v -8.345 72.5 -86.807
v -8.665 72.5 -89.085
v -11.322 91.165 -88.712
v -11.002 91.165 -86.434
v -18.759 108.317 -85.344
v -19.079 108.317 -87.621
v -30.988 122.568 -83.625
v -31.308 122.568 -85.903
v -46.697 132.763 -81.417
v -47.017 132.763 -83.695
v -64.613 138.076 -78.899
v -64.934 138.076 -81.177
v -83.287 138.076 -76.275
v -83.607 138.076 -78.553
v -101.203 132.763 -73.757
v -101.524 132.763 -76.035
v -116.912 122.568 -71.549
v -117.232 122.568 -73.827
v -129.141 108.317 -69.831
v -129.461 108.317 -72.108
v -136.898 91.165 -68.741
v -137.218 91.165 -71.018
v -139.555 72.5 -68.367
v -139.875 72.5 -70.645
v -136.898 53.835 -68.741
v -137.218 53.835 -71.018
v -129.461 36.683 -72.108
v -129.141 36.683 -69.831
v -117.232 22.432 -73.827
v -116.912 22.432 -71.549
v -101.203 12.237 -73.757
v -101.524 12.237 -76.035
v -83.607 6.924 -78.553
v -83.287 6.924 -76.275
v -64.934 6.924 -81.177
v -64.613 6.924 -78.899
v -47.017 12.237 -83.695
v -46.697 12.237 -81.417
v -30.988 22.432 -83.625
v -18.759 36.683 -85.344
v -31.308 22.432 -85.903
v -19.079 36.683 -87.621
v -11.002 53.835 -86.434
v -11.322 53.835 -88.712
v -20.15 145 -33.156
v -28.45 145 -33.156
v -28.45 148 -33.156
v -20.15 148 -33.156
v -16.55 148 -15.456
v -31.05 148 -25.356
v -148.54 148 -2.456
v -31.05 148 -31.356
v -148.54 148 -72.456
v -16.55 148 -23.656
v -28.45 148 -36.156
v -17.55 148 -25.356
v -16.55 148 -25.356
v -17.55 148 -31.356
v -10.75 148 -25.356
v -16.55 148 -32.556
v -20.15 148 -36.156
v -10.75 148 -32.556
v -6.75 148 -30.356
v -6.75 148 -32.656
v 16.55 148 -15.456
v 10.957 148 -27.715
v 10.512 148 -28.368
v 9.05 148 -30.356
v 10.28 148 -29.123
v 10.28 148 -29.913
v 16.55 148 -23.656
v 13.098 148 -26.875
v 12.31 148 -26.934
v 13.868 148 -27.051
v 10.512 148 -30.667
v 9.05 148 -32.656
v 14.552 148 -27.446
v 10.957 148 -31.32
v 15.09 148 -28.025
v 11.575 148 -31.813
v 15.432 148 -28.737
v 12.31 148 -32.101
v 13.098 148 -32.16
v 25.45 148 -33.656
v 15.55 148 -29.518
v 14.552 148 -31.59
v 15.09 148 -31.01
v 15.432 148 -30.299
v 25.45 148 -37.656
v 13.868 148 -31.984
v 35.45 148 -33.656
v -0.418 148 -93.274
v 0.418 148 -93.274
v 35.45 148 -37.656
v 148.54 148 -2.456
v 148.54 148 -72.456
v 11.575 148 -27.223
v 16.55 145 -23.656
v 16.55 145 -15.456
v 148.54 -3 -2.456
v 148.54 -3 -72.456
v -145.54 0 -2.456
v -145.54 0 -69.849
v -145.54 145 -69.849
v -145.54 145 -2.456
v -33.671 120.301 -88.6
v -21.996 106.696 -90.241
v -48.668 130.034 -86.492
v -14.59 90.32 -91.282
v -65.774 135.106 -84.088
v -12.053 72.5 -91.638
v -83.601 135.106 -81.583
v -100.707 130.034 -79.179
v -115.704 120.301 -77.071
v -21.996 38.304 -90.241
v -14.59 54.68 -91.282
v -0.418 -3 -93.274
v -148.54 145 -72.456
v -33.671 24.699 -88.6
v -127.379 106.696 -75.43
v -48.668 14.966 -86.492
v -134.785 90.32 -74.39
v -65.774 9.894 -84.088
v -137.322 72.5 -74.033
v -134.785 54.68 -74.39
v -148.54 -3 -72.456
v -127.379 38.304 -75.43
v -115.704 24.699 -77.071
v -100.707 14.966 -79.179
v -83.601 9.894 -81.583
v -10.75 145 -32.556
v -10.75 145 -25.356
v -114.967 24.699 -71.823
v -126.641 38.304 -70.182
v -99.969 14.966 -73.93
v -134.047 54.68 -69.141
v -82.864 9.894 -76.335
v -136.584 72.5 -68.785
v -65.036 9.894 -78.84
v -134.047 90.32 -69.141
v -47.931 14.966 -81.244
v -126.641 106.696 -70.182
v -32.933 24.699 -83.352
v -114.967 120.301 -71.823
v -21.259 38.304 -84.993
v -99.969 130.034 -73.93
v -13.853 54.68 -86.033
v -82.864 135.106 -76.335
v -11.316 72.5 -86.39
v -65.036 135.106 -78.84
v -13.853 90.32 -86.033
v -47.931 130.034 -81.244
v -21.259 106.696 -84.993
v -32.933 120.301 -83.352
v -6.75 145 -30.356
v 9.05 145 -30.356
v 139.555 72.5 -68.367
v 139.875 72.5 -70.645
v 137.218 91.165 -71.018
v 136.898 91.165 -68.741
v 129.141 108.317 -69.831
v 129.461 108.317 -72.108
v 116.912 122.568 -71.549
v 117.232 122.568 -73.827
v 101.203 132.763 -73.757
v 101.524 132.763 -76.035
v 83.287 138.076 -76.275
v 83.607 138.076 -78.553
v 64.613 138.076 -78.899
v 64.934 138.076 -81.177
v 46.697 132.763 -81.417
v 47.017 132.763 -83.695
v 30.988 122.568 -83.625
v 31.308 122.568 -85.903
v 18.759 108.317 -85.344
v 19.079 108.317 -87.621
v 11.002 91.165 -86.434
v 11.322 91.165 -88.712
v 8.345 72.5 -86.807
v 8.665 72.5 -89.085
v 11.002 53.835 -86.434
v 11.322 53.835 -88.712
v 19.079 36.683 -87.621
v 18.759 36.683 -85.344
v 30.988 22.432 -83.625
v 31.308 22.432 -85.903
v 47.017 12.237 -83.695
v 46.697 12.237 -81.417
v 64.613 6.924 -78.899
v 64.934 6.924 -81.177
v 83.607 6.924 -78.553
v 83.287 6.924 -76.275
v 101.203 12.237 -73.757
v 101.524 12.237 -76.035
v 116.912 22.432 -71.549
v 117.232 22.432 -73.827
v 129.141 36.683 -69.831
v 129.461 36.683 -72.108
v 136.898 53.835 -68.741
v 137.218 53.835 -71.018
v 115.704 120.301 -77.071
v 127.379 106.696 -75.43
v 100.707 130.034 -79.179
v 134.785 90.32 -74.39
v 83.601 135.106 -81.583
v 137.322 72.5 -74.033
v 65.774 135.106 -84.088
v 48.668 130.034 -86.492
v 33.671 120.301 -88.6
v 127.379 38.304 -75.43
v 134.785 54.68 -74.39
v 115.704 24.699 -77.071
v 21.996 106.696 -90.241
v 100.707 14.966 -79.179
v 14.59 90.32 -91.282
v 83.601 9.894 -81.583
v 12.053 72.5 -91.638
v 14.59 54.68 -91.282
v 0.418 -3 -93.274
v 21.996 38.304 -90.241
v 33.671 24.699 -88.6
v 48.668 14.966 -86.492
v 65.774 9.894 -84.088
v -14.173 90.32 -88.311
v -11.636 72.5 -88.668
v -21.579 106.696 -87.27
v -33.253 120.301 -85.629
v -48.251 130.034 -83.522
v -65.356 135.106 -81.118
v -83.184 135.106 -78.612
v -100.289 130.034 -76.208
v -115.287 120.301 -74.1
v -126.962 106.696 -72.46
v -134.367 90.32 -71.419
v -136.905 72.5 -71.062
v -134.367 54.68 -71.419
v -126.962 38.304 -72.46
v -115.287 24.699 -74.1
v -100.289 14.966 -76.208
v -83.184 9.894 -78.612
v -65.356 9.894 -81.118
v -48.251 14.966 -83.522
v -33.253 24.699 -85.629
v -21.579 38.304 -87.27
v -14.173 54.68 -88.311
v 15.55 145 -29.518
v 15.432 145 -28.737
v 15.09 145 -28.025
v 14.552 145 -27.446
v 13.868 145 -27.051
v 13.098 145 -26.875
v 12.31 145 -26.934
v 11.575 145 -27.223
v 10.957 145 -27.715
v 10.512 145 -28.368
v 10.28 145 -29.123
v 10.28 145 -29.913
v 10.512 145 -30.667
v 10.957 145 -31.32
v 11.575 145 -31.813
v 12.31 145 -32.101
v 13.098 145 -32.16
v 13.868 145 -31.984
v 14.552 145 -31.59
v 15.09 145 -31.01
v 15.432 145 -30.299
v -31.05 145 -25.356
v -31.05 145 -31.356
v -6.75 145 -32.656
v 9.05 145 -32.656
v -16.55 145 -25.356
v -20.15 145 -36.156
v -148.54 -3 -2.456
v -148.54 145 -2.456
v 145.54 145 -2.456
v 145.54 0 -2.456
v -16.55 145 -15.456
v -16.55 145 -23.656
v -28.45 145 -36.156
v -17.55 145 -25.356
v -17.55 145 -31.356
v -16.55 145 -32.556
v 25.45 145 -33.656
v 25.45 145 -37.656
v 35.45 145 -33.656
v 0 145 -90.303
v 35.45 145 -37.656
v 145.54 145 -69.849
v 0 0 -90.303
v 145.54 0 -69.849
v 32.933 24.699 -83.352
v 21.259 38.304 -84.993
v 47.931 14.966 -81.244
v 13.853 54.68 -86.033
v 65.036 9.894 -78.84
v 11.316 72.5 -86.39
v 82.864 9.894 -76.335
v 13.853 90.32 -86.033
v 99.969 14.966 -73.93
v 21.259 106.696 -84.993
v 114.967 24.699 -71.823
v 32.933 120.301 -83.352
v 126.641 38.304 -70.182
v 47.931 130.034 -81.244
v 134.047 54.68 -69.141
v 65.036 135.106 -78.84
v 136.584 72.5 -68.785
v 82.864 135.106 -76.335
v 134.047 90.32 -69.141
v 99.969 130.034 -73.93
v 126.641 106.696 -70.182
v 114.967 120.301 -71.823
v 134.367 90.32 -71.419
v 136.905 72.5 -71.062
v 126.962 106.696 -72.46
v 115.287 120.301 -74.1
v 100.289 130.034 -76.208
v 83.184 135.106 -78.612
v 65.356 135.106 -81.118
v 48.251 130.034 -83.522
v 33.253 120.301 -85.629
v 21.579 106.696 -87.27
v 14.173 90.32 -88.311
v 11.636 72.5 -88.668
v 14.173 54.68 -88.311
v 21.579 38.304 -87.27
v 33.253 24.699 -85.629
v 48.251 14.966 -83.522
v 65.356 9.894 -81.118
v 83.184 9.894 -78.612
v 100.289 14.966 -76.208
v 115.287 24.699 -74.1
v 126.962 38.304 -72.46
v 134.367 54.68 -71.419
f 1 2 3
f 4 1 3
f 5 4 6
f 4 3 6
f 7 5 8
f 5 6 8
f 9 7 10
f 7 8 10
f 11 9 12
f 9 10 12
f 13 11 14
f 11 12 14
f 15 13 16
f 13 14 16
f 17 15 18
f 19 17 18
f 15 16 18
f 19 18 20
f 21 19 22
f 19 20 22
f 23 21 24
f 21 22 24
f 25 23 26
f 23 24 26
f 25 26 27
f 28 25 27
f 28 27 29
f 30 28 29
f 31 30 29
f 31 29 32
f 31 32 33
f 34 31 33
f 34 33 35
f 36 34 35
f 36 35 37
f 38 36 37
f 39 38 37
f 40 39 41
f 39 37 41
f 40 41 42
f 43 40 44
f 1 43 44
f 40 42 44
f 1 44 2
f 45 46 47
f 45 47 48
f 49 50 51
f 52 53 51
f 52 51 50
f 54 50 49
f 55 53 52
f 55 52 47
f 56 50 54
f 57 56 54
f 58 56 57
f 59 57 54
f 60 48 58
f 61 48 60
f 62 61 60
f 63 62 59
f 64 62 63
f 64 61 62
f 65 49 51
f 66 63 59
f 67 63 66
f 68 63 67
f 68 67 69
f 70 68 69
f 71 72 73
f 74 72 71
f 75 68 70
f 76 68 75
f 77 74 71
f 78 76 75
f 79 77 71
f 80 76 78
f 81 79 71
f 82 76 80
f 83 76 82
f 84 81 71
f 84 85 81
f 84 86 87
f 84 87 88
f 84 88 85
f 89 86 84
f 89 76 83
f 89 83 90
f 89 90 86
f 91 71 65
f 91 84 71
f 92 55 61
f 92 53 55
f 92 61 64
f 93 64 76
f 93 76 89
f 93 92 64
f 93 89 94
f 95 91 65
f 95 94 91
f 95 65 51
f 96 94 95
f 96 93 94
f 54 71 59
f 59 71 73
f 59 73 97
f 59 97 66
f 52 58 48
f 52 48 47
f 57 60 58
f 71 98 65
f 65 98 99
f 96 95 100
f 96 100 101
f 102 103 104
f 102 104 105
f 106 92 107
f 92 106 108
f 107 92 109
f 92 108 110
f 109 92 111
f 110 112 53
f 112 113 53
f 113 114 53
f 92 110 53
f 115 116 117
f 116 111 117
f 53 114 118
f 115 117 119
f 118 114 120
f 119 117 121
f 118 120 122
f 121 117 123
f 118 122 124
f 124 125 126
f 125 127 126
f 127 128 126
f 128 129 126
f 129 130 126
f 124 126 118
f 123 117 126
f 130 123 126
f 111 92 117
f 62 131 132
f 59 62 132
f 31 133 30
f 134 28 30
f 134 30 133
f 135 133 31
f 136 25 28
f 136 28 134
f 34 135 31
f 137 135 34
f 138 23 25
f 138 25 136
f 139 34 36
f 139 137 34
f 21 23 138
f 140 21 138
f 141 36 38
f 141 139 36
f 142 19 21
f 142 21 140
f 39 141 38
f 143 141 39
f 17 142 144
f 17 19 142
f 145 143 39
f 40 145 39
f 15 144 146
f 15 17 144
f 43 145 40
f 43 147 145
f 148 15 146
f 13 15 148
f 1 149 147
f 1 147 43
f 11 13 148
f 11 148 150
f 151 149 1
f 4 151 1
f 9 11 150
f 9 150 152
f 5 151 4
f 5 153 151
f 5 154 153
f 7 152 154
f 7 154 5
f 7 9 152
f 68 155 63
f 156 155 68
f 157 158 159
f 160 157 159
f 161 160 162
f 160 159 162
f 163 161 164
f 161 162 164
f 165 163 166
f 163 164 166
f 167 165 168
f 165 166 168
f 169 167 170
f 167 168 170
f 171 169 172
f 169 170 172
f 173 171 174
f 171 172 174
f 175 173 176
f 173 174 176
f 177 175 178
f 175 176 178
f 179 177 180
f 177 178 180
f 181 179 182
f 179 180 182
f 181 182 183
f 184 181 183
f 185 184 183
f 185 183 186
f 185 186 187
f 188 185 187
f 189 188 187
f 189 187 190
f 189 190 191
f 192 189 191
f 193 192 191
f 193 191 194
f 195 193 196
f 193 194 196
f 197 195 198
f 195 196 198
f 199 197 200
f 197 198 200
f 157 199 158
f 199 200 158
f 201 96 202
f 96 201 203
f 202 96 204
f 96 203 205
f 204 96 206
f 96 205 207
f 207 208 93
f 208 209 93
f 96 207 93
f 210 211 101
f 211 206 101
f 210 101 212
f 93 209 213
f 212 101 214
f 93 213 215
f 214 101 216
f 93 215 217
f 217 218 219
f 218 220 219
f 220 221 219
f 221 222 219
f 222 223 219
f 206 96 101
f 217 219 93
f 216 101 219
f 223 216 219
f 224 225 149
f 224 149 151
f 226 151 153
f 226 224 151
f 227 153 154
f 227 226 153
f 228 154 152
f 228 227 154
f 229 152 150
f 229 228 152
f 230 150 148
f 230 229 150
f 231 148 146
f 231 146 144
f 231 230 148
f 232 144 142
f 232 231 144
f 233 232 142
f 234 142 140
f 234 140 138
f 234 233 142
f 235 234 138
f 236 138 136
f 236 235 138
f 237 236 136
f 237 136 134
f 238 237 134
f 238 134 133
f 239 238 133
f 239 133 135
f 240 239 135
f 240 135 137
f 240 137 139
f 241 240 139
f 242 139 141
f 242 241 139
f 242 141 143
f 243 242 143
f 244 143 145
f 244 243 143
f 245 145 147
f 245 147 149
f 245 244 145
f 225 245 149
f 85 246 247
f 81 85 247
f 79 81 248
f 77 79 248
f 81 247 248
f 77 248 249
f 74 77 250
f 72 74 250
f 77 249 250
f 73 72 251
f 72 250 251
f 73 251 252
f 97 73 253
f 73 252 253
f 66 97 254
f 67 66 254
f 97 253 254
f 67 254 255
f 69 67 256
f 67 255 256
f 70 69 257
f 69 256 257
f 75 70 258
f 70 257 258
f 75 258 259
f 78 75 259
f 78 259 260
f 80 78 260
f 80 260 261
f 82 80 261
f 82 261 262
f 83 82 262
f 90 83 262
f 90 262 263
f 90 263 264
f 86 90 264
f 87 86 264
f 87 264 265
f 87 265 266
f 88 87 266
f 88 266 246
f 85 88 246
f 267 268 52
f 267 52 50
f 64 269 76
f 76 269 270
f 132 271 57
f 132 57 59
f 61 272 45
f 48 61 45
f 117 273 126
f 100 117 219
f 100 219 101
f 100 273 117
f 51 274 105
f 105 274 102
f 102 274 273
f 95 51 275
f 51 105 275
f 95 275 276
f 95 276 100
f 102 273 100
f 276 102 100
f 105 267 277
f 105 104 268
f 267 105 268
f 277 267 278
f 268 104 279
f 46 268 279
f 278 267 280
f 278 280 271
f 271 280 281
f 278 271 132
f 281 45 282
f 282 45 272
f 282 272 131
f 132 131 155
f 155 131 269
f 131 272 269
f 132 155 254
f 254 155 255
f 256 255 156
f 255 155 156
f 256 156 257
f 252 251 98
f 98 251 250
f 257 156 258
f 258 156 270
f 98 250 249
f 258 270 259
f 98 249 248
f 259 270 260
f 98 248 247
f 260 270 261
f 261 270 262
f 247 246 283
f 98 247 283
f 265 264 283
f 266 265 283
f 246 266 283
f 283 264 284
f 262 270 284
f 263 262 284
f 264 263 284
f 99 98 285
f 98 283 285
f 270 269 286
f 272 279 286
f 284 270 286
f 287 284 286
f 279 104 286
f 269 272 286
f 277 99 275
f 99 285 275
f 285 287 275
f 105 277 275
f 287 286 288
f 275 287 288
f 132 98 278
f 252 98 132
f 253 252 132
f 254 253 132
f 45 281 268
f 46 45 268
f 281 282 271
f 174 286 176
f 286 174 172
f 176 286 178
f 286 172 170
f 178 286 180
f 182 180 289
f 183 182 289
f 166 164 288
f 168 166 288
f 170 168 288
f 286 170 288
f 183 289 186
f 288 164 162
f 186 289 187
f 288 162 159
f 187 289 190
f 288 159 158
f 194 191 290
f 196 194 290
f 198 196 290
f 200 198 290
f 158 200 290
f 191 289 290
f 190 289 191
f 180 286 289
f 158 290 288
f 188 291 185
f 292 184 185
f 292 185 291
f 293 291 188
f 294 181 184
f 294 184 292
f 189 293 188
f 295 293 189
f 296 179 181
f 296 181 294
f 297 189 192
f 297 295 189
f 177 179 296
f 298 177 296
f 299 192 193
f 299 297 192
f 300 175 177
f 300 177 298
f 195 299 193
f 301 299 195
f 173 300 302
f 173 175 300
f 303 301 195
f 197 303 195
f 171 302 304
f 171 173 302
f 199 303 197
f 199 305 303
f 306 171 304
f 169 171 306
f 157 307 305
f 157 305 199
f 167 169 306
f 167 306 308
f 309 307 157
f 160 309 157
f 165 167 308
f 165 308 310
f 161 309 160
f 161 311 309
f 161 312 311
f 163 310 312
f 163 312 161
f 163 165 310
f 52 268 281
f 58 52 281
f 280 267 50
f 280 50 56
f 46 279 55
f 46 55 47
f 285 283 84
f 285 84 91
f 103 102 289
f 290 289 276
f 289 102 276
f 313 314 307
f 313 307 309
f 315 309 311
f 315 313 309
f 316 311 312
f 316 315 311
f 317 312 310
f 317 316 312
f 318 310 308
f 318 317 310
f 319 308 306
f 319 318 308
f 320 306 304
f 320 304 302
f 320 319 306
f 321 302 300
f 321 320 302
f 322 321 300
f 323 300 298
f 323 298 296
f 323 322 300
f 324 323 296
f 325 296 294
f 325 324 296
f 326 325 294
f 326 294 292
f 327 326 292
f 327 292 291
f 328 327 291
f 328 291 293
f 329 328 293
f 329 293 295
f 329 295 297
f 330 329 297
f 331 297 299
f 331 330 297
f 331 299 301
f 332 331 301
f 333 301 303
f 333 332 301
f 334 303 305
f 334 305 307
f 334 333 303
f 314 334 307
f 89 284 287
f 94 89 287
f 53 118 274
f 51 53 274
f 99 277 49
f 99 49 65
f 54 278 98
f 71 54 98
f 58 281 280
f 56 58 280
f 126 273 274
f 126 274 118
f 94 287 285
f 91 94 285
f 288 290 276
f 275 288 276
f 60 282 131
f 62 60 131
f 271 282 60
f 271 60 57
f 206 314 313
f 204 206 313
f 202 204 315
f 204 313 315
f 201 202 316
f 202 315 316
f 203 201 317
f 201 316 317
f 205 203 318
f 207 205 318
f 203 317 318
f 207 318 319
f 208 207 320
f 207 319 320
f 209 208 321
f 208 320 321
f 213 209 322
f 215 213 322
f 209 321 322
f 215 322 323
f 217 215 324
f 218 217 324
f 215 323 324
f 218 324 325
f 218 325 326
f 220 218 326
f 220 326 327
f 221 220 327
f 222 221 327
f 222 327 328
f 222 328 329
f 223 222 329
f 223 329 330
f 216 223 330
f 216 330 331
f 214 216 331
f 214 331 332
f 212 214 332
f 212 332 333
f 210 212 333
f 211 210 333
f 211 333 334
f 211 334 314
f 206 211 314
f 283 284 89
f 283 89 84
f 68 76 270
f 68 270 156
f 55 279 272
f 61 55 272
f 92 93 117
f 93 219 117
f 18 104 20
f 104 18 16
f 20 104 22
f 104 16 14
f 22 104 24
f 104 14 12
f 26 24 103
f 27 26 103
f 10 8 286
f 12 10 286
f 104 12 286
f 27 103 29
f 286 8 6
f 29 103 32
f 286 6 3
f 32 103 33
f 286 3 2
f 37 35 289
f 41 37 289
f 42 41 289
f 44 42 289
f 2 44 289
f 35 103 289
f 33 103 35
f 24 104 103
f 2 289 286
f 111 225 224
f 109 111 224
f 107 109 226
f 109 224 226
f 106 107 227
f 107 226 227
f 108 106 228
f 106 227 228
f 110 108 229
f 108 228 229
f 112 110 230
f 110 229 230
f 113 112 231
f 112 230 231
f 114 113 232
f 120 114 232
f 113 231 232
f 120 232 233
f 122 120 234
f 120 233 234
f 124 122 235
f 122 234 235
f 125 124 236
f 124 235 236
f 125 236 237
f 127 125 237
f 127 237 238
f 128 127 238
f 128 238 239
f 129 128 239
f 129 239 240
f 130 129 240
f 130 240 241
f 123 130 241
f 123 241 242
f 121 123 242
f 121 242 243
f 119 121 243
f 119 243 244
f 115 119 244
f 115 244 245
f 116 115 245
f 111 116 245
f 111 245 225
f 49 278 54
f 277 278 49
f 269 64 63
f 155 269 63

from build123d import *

# Parameters (mm, degrees)
SALIENTE_EXTRUIR1_DEPTH = 145
CROQUIS3_R              = 66.25
CROQUIS3_R_2            = 63.25
SALIENTE_EXTRUIR2_DEPTH = 2.3
CROQUIS5_R              = 66.25
CROQUIS5_R_2            = 63.25
SALIENTE_EXTRUIR3_DEPTH = 2.3
CROQUIS6_R              = 63.25
CORTAR_EXTRUIR3_DEPTH   = 24.61469423
CROQUIS7_R              = 63.25
CORTAR_EXTRUIR4_DEPTH   = 24.61469423
SALIENTE_EXTRUIR4_DEPTH = 3
CROQUIS10_W             = 3
CROQUIS10_H             = 70
SALIENTE_EXTRUIR5_DEPTH = 148
SALIENTE_EXTRUIR6_DEPTH = 3
CROQUIS12_R             = 2.65
CROQUIS12_W             = 33.1
CROQUIS12_H             = 8.2
CROQUIS12_W_2           = 5.8
CROQUIS12_H_2           = 7.2
CROQUIS12_W_3           = 15.8
CROQUIS12_H_3           = 2.3
CROQUIS12_W_4           = 13.5
CROQUIS12_H_4           = 6
CROQUIS12_W_5           = 8.3
CROQUIS12_H_5           = 3
CROQUIS12_W_6           = 10
CROQUIS12_H_6           = 4
CORTAR_EXTRUIR5_DEPTH   = 10


with BuildPart() as part:
    # Croquis2 → Saliente-Extruir1 (new body)
    with BuildSketch(Plane(origin=(0, 0, 0), x_dir=(1, 0, 0), z_dir=(0, 1, 0))):
        Polygon((0, 90.302866191), (148.540210311, 69.426901047), (148.540210311, 72.456383764), (0.417519303, 93.273670397), (-0.417519303, 93.273670397), (-148.540210311, 72.456383764), (-148.540210311, 69.426901047), align=None)
    extrude(amount=SALIENTE_EXTRUIR1_DEPTH)

    # Croquis3 → Saliente-Extruir2 (add)
    with BuildSketch(Plane(origin=(12.44542163, 0, -88.553776247), x_dir=(0.990268069, 0, 0.139173101), z_dir=(-0.139173101, 0, 0.990268069))):
        with Locations((62.432270087, 72.5)):
            Circle(CROQUIS3_R)
        with Locations((62.432270087, 72.5)):
            Circle(CROQUIS3_R_2, mode=Mode.SUBTRACT)
    extrude(amount=SALIENTE_EXTRUIR2_DEPTH)

    # Croquis5 → Saliente-Extruir3 (add)
    with BuildSketch(Plane(origin=(-12.44542163, 0, -88.553776247), x_dir=(0.990268069, 0, -0.139173101), z_dir=(0.139173101, 0, 0.990268069))):
        with Locations((-62.432270087, 72.5)):
            Circle(CROQUIS5_R)
        with Locations((-62.432270087, 72.5)):
            Circle(CROQUIS5_R_2, mode=Mode.SUBTRACT)
    extrude(amount=SALIENTE_EXTRUIR3_DEPTH)

    # Croquis6 → Cortar-Extruir3 (cut, through all)
    with BuildSketch(Plane(origin=(-12.44542163, 0, -88.553776247), x_dir=(0.990268069, 0, -0.139173101), z_dir=(0.139173101, 0, 0.990268069))):
        with Locations((-62.432270087, 72.5)):
            Circle(CROQUIS6_R)
    extrude(amount=-CORTAR_EXTRUIR3_DEPTH, mode=Mode.SUBTRACT)

    # Croquis7 → Cortar-Extruir4 (cut, through all)
    with BuildSketch(Plane(origin=(12.44542163, 0, -88.553776247), x_dir=(0.990268069, 0, 0.139173101), z_dir=(-0.139173101, 0, 0.990268069))):
        with Locations((62.432270087, 72.5)):
            Circle(CROQUIS7_R)
    extrude(amount=-CORTAR_EXTRUIR4_DEPTH, mode=Mode.SUBTRACT)

    # Croquis9 → Saliente-Extruir4 (add)
    with BuildSketch(Plane.XZ):
        Polygon((-148.540210311, -72.456383764), (-0.417519303, -93.273670397), (0.417519303, -93.273670397), (148.540210311, -72.456383764), (148.540210311, -2.456383764), (-148.540210311, -2.456383764), align=None)
    extrude(amount=SALIENTE_EXTRUIR4_DEPTH)

    # Croquis10 → Saliente-Extruir5 (add)
    with BuildSketch(Plane.XZ.offset(3)):
        with Locations((-147.040210311, -37.456383764)):
            Rectangle(CROQUIS10_W, CROQUIS10_H)
        with Locations((147.040210311, -37.456383764)):
            Rectangle(CROQUIS10_W, CROQUIS10_H)
    extrude(amount=-SALIENTE_EXTRUIR5_DEPTH)

    # Croquis11 → Saliente-Extruir6 (add)
    with BuildSketch(Plane(origin=(0, 145, 0), x_dir=(1, 0, 0), z_dir=(0, 1, 0))):
        Polygon((148.540210311, 72.456383764), (0.417519303, 93.273670397), (-0.417519303, 93.273670397), (-148.540210311, 72.456383764), (-148.540210311, 2.456383764), (148.540210311, 2.456383764), align=None)
    extrude(amount=SALIENTE_EXTRUIR6_DEPTH)

    # Croquis12 → Cortar-Extruir5 (cut)
    with BuildSketch(Plane.XZ.offset(-145)):
        with Locations((12.9, -29.517649177)):
            Circle(CROQUIS12_R)
        with Locations((0, -19.556383764)):
            Rectangle(CROQUIS12_W, CROQUIS12_H)
        with Locations((-13.65, -28.956383764)):
            Rectangle(CROQUIS12_W_2, CROQUIS12_H_2)
        with Locations((1.15, -31.506383764)):
            Rectangle(CROQUIS12_W_3, CROQUIS12_H_3)
        with Locations((-24.3, -28.356383764)):
            Rectangle(CROQUIS12_W_4, CROQUIS12_H_4)
        with Locations((-24.3, -34.656383764)):
            Rectangle(CROQUIS12_W_5, CROQUIS12_H_5)
        with Locations((30.45, -35.656383764)):
            Rectangle(CROQUIS12_W_6, CROQUIS12_H_6)
    extrude(amount=-CORTAR_EXTRUIR5_DEPTH, mode=Mode.SUBTRACT)


solid = part.part
